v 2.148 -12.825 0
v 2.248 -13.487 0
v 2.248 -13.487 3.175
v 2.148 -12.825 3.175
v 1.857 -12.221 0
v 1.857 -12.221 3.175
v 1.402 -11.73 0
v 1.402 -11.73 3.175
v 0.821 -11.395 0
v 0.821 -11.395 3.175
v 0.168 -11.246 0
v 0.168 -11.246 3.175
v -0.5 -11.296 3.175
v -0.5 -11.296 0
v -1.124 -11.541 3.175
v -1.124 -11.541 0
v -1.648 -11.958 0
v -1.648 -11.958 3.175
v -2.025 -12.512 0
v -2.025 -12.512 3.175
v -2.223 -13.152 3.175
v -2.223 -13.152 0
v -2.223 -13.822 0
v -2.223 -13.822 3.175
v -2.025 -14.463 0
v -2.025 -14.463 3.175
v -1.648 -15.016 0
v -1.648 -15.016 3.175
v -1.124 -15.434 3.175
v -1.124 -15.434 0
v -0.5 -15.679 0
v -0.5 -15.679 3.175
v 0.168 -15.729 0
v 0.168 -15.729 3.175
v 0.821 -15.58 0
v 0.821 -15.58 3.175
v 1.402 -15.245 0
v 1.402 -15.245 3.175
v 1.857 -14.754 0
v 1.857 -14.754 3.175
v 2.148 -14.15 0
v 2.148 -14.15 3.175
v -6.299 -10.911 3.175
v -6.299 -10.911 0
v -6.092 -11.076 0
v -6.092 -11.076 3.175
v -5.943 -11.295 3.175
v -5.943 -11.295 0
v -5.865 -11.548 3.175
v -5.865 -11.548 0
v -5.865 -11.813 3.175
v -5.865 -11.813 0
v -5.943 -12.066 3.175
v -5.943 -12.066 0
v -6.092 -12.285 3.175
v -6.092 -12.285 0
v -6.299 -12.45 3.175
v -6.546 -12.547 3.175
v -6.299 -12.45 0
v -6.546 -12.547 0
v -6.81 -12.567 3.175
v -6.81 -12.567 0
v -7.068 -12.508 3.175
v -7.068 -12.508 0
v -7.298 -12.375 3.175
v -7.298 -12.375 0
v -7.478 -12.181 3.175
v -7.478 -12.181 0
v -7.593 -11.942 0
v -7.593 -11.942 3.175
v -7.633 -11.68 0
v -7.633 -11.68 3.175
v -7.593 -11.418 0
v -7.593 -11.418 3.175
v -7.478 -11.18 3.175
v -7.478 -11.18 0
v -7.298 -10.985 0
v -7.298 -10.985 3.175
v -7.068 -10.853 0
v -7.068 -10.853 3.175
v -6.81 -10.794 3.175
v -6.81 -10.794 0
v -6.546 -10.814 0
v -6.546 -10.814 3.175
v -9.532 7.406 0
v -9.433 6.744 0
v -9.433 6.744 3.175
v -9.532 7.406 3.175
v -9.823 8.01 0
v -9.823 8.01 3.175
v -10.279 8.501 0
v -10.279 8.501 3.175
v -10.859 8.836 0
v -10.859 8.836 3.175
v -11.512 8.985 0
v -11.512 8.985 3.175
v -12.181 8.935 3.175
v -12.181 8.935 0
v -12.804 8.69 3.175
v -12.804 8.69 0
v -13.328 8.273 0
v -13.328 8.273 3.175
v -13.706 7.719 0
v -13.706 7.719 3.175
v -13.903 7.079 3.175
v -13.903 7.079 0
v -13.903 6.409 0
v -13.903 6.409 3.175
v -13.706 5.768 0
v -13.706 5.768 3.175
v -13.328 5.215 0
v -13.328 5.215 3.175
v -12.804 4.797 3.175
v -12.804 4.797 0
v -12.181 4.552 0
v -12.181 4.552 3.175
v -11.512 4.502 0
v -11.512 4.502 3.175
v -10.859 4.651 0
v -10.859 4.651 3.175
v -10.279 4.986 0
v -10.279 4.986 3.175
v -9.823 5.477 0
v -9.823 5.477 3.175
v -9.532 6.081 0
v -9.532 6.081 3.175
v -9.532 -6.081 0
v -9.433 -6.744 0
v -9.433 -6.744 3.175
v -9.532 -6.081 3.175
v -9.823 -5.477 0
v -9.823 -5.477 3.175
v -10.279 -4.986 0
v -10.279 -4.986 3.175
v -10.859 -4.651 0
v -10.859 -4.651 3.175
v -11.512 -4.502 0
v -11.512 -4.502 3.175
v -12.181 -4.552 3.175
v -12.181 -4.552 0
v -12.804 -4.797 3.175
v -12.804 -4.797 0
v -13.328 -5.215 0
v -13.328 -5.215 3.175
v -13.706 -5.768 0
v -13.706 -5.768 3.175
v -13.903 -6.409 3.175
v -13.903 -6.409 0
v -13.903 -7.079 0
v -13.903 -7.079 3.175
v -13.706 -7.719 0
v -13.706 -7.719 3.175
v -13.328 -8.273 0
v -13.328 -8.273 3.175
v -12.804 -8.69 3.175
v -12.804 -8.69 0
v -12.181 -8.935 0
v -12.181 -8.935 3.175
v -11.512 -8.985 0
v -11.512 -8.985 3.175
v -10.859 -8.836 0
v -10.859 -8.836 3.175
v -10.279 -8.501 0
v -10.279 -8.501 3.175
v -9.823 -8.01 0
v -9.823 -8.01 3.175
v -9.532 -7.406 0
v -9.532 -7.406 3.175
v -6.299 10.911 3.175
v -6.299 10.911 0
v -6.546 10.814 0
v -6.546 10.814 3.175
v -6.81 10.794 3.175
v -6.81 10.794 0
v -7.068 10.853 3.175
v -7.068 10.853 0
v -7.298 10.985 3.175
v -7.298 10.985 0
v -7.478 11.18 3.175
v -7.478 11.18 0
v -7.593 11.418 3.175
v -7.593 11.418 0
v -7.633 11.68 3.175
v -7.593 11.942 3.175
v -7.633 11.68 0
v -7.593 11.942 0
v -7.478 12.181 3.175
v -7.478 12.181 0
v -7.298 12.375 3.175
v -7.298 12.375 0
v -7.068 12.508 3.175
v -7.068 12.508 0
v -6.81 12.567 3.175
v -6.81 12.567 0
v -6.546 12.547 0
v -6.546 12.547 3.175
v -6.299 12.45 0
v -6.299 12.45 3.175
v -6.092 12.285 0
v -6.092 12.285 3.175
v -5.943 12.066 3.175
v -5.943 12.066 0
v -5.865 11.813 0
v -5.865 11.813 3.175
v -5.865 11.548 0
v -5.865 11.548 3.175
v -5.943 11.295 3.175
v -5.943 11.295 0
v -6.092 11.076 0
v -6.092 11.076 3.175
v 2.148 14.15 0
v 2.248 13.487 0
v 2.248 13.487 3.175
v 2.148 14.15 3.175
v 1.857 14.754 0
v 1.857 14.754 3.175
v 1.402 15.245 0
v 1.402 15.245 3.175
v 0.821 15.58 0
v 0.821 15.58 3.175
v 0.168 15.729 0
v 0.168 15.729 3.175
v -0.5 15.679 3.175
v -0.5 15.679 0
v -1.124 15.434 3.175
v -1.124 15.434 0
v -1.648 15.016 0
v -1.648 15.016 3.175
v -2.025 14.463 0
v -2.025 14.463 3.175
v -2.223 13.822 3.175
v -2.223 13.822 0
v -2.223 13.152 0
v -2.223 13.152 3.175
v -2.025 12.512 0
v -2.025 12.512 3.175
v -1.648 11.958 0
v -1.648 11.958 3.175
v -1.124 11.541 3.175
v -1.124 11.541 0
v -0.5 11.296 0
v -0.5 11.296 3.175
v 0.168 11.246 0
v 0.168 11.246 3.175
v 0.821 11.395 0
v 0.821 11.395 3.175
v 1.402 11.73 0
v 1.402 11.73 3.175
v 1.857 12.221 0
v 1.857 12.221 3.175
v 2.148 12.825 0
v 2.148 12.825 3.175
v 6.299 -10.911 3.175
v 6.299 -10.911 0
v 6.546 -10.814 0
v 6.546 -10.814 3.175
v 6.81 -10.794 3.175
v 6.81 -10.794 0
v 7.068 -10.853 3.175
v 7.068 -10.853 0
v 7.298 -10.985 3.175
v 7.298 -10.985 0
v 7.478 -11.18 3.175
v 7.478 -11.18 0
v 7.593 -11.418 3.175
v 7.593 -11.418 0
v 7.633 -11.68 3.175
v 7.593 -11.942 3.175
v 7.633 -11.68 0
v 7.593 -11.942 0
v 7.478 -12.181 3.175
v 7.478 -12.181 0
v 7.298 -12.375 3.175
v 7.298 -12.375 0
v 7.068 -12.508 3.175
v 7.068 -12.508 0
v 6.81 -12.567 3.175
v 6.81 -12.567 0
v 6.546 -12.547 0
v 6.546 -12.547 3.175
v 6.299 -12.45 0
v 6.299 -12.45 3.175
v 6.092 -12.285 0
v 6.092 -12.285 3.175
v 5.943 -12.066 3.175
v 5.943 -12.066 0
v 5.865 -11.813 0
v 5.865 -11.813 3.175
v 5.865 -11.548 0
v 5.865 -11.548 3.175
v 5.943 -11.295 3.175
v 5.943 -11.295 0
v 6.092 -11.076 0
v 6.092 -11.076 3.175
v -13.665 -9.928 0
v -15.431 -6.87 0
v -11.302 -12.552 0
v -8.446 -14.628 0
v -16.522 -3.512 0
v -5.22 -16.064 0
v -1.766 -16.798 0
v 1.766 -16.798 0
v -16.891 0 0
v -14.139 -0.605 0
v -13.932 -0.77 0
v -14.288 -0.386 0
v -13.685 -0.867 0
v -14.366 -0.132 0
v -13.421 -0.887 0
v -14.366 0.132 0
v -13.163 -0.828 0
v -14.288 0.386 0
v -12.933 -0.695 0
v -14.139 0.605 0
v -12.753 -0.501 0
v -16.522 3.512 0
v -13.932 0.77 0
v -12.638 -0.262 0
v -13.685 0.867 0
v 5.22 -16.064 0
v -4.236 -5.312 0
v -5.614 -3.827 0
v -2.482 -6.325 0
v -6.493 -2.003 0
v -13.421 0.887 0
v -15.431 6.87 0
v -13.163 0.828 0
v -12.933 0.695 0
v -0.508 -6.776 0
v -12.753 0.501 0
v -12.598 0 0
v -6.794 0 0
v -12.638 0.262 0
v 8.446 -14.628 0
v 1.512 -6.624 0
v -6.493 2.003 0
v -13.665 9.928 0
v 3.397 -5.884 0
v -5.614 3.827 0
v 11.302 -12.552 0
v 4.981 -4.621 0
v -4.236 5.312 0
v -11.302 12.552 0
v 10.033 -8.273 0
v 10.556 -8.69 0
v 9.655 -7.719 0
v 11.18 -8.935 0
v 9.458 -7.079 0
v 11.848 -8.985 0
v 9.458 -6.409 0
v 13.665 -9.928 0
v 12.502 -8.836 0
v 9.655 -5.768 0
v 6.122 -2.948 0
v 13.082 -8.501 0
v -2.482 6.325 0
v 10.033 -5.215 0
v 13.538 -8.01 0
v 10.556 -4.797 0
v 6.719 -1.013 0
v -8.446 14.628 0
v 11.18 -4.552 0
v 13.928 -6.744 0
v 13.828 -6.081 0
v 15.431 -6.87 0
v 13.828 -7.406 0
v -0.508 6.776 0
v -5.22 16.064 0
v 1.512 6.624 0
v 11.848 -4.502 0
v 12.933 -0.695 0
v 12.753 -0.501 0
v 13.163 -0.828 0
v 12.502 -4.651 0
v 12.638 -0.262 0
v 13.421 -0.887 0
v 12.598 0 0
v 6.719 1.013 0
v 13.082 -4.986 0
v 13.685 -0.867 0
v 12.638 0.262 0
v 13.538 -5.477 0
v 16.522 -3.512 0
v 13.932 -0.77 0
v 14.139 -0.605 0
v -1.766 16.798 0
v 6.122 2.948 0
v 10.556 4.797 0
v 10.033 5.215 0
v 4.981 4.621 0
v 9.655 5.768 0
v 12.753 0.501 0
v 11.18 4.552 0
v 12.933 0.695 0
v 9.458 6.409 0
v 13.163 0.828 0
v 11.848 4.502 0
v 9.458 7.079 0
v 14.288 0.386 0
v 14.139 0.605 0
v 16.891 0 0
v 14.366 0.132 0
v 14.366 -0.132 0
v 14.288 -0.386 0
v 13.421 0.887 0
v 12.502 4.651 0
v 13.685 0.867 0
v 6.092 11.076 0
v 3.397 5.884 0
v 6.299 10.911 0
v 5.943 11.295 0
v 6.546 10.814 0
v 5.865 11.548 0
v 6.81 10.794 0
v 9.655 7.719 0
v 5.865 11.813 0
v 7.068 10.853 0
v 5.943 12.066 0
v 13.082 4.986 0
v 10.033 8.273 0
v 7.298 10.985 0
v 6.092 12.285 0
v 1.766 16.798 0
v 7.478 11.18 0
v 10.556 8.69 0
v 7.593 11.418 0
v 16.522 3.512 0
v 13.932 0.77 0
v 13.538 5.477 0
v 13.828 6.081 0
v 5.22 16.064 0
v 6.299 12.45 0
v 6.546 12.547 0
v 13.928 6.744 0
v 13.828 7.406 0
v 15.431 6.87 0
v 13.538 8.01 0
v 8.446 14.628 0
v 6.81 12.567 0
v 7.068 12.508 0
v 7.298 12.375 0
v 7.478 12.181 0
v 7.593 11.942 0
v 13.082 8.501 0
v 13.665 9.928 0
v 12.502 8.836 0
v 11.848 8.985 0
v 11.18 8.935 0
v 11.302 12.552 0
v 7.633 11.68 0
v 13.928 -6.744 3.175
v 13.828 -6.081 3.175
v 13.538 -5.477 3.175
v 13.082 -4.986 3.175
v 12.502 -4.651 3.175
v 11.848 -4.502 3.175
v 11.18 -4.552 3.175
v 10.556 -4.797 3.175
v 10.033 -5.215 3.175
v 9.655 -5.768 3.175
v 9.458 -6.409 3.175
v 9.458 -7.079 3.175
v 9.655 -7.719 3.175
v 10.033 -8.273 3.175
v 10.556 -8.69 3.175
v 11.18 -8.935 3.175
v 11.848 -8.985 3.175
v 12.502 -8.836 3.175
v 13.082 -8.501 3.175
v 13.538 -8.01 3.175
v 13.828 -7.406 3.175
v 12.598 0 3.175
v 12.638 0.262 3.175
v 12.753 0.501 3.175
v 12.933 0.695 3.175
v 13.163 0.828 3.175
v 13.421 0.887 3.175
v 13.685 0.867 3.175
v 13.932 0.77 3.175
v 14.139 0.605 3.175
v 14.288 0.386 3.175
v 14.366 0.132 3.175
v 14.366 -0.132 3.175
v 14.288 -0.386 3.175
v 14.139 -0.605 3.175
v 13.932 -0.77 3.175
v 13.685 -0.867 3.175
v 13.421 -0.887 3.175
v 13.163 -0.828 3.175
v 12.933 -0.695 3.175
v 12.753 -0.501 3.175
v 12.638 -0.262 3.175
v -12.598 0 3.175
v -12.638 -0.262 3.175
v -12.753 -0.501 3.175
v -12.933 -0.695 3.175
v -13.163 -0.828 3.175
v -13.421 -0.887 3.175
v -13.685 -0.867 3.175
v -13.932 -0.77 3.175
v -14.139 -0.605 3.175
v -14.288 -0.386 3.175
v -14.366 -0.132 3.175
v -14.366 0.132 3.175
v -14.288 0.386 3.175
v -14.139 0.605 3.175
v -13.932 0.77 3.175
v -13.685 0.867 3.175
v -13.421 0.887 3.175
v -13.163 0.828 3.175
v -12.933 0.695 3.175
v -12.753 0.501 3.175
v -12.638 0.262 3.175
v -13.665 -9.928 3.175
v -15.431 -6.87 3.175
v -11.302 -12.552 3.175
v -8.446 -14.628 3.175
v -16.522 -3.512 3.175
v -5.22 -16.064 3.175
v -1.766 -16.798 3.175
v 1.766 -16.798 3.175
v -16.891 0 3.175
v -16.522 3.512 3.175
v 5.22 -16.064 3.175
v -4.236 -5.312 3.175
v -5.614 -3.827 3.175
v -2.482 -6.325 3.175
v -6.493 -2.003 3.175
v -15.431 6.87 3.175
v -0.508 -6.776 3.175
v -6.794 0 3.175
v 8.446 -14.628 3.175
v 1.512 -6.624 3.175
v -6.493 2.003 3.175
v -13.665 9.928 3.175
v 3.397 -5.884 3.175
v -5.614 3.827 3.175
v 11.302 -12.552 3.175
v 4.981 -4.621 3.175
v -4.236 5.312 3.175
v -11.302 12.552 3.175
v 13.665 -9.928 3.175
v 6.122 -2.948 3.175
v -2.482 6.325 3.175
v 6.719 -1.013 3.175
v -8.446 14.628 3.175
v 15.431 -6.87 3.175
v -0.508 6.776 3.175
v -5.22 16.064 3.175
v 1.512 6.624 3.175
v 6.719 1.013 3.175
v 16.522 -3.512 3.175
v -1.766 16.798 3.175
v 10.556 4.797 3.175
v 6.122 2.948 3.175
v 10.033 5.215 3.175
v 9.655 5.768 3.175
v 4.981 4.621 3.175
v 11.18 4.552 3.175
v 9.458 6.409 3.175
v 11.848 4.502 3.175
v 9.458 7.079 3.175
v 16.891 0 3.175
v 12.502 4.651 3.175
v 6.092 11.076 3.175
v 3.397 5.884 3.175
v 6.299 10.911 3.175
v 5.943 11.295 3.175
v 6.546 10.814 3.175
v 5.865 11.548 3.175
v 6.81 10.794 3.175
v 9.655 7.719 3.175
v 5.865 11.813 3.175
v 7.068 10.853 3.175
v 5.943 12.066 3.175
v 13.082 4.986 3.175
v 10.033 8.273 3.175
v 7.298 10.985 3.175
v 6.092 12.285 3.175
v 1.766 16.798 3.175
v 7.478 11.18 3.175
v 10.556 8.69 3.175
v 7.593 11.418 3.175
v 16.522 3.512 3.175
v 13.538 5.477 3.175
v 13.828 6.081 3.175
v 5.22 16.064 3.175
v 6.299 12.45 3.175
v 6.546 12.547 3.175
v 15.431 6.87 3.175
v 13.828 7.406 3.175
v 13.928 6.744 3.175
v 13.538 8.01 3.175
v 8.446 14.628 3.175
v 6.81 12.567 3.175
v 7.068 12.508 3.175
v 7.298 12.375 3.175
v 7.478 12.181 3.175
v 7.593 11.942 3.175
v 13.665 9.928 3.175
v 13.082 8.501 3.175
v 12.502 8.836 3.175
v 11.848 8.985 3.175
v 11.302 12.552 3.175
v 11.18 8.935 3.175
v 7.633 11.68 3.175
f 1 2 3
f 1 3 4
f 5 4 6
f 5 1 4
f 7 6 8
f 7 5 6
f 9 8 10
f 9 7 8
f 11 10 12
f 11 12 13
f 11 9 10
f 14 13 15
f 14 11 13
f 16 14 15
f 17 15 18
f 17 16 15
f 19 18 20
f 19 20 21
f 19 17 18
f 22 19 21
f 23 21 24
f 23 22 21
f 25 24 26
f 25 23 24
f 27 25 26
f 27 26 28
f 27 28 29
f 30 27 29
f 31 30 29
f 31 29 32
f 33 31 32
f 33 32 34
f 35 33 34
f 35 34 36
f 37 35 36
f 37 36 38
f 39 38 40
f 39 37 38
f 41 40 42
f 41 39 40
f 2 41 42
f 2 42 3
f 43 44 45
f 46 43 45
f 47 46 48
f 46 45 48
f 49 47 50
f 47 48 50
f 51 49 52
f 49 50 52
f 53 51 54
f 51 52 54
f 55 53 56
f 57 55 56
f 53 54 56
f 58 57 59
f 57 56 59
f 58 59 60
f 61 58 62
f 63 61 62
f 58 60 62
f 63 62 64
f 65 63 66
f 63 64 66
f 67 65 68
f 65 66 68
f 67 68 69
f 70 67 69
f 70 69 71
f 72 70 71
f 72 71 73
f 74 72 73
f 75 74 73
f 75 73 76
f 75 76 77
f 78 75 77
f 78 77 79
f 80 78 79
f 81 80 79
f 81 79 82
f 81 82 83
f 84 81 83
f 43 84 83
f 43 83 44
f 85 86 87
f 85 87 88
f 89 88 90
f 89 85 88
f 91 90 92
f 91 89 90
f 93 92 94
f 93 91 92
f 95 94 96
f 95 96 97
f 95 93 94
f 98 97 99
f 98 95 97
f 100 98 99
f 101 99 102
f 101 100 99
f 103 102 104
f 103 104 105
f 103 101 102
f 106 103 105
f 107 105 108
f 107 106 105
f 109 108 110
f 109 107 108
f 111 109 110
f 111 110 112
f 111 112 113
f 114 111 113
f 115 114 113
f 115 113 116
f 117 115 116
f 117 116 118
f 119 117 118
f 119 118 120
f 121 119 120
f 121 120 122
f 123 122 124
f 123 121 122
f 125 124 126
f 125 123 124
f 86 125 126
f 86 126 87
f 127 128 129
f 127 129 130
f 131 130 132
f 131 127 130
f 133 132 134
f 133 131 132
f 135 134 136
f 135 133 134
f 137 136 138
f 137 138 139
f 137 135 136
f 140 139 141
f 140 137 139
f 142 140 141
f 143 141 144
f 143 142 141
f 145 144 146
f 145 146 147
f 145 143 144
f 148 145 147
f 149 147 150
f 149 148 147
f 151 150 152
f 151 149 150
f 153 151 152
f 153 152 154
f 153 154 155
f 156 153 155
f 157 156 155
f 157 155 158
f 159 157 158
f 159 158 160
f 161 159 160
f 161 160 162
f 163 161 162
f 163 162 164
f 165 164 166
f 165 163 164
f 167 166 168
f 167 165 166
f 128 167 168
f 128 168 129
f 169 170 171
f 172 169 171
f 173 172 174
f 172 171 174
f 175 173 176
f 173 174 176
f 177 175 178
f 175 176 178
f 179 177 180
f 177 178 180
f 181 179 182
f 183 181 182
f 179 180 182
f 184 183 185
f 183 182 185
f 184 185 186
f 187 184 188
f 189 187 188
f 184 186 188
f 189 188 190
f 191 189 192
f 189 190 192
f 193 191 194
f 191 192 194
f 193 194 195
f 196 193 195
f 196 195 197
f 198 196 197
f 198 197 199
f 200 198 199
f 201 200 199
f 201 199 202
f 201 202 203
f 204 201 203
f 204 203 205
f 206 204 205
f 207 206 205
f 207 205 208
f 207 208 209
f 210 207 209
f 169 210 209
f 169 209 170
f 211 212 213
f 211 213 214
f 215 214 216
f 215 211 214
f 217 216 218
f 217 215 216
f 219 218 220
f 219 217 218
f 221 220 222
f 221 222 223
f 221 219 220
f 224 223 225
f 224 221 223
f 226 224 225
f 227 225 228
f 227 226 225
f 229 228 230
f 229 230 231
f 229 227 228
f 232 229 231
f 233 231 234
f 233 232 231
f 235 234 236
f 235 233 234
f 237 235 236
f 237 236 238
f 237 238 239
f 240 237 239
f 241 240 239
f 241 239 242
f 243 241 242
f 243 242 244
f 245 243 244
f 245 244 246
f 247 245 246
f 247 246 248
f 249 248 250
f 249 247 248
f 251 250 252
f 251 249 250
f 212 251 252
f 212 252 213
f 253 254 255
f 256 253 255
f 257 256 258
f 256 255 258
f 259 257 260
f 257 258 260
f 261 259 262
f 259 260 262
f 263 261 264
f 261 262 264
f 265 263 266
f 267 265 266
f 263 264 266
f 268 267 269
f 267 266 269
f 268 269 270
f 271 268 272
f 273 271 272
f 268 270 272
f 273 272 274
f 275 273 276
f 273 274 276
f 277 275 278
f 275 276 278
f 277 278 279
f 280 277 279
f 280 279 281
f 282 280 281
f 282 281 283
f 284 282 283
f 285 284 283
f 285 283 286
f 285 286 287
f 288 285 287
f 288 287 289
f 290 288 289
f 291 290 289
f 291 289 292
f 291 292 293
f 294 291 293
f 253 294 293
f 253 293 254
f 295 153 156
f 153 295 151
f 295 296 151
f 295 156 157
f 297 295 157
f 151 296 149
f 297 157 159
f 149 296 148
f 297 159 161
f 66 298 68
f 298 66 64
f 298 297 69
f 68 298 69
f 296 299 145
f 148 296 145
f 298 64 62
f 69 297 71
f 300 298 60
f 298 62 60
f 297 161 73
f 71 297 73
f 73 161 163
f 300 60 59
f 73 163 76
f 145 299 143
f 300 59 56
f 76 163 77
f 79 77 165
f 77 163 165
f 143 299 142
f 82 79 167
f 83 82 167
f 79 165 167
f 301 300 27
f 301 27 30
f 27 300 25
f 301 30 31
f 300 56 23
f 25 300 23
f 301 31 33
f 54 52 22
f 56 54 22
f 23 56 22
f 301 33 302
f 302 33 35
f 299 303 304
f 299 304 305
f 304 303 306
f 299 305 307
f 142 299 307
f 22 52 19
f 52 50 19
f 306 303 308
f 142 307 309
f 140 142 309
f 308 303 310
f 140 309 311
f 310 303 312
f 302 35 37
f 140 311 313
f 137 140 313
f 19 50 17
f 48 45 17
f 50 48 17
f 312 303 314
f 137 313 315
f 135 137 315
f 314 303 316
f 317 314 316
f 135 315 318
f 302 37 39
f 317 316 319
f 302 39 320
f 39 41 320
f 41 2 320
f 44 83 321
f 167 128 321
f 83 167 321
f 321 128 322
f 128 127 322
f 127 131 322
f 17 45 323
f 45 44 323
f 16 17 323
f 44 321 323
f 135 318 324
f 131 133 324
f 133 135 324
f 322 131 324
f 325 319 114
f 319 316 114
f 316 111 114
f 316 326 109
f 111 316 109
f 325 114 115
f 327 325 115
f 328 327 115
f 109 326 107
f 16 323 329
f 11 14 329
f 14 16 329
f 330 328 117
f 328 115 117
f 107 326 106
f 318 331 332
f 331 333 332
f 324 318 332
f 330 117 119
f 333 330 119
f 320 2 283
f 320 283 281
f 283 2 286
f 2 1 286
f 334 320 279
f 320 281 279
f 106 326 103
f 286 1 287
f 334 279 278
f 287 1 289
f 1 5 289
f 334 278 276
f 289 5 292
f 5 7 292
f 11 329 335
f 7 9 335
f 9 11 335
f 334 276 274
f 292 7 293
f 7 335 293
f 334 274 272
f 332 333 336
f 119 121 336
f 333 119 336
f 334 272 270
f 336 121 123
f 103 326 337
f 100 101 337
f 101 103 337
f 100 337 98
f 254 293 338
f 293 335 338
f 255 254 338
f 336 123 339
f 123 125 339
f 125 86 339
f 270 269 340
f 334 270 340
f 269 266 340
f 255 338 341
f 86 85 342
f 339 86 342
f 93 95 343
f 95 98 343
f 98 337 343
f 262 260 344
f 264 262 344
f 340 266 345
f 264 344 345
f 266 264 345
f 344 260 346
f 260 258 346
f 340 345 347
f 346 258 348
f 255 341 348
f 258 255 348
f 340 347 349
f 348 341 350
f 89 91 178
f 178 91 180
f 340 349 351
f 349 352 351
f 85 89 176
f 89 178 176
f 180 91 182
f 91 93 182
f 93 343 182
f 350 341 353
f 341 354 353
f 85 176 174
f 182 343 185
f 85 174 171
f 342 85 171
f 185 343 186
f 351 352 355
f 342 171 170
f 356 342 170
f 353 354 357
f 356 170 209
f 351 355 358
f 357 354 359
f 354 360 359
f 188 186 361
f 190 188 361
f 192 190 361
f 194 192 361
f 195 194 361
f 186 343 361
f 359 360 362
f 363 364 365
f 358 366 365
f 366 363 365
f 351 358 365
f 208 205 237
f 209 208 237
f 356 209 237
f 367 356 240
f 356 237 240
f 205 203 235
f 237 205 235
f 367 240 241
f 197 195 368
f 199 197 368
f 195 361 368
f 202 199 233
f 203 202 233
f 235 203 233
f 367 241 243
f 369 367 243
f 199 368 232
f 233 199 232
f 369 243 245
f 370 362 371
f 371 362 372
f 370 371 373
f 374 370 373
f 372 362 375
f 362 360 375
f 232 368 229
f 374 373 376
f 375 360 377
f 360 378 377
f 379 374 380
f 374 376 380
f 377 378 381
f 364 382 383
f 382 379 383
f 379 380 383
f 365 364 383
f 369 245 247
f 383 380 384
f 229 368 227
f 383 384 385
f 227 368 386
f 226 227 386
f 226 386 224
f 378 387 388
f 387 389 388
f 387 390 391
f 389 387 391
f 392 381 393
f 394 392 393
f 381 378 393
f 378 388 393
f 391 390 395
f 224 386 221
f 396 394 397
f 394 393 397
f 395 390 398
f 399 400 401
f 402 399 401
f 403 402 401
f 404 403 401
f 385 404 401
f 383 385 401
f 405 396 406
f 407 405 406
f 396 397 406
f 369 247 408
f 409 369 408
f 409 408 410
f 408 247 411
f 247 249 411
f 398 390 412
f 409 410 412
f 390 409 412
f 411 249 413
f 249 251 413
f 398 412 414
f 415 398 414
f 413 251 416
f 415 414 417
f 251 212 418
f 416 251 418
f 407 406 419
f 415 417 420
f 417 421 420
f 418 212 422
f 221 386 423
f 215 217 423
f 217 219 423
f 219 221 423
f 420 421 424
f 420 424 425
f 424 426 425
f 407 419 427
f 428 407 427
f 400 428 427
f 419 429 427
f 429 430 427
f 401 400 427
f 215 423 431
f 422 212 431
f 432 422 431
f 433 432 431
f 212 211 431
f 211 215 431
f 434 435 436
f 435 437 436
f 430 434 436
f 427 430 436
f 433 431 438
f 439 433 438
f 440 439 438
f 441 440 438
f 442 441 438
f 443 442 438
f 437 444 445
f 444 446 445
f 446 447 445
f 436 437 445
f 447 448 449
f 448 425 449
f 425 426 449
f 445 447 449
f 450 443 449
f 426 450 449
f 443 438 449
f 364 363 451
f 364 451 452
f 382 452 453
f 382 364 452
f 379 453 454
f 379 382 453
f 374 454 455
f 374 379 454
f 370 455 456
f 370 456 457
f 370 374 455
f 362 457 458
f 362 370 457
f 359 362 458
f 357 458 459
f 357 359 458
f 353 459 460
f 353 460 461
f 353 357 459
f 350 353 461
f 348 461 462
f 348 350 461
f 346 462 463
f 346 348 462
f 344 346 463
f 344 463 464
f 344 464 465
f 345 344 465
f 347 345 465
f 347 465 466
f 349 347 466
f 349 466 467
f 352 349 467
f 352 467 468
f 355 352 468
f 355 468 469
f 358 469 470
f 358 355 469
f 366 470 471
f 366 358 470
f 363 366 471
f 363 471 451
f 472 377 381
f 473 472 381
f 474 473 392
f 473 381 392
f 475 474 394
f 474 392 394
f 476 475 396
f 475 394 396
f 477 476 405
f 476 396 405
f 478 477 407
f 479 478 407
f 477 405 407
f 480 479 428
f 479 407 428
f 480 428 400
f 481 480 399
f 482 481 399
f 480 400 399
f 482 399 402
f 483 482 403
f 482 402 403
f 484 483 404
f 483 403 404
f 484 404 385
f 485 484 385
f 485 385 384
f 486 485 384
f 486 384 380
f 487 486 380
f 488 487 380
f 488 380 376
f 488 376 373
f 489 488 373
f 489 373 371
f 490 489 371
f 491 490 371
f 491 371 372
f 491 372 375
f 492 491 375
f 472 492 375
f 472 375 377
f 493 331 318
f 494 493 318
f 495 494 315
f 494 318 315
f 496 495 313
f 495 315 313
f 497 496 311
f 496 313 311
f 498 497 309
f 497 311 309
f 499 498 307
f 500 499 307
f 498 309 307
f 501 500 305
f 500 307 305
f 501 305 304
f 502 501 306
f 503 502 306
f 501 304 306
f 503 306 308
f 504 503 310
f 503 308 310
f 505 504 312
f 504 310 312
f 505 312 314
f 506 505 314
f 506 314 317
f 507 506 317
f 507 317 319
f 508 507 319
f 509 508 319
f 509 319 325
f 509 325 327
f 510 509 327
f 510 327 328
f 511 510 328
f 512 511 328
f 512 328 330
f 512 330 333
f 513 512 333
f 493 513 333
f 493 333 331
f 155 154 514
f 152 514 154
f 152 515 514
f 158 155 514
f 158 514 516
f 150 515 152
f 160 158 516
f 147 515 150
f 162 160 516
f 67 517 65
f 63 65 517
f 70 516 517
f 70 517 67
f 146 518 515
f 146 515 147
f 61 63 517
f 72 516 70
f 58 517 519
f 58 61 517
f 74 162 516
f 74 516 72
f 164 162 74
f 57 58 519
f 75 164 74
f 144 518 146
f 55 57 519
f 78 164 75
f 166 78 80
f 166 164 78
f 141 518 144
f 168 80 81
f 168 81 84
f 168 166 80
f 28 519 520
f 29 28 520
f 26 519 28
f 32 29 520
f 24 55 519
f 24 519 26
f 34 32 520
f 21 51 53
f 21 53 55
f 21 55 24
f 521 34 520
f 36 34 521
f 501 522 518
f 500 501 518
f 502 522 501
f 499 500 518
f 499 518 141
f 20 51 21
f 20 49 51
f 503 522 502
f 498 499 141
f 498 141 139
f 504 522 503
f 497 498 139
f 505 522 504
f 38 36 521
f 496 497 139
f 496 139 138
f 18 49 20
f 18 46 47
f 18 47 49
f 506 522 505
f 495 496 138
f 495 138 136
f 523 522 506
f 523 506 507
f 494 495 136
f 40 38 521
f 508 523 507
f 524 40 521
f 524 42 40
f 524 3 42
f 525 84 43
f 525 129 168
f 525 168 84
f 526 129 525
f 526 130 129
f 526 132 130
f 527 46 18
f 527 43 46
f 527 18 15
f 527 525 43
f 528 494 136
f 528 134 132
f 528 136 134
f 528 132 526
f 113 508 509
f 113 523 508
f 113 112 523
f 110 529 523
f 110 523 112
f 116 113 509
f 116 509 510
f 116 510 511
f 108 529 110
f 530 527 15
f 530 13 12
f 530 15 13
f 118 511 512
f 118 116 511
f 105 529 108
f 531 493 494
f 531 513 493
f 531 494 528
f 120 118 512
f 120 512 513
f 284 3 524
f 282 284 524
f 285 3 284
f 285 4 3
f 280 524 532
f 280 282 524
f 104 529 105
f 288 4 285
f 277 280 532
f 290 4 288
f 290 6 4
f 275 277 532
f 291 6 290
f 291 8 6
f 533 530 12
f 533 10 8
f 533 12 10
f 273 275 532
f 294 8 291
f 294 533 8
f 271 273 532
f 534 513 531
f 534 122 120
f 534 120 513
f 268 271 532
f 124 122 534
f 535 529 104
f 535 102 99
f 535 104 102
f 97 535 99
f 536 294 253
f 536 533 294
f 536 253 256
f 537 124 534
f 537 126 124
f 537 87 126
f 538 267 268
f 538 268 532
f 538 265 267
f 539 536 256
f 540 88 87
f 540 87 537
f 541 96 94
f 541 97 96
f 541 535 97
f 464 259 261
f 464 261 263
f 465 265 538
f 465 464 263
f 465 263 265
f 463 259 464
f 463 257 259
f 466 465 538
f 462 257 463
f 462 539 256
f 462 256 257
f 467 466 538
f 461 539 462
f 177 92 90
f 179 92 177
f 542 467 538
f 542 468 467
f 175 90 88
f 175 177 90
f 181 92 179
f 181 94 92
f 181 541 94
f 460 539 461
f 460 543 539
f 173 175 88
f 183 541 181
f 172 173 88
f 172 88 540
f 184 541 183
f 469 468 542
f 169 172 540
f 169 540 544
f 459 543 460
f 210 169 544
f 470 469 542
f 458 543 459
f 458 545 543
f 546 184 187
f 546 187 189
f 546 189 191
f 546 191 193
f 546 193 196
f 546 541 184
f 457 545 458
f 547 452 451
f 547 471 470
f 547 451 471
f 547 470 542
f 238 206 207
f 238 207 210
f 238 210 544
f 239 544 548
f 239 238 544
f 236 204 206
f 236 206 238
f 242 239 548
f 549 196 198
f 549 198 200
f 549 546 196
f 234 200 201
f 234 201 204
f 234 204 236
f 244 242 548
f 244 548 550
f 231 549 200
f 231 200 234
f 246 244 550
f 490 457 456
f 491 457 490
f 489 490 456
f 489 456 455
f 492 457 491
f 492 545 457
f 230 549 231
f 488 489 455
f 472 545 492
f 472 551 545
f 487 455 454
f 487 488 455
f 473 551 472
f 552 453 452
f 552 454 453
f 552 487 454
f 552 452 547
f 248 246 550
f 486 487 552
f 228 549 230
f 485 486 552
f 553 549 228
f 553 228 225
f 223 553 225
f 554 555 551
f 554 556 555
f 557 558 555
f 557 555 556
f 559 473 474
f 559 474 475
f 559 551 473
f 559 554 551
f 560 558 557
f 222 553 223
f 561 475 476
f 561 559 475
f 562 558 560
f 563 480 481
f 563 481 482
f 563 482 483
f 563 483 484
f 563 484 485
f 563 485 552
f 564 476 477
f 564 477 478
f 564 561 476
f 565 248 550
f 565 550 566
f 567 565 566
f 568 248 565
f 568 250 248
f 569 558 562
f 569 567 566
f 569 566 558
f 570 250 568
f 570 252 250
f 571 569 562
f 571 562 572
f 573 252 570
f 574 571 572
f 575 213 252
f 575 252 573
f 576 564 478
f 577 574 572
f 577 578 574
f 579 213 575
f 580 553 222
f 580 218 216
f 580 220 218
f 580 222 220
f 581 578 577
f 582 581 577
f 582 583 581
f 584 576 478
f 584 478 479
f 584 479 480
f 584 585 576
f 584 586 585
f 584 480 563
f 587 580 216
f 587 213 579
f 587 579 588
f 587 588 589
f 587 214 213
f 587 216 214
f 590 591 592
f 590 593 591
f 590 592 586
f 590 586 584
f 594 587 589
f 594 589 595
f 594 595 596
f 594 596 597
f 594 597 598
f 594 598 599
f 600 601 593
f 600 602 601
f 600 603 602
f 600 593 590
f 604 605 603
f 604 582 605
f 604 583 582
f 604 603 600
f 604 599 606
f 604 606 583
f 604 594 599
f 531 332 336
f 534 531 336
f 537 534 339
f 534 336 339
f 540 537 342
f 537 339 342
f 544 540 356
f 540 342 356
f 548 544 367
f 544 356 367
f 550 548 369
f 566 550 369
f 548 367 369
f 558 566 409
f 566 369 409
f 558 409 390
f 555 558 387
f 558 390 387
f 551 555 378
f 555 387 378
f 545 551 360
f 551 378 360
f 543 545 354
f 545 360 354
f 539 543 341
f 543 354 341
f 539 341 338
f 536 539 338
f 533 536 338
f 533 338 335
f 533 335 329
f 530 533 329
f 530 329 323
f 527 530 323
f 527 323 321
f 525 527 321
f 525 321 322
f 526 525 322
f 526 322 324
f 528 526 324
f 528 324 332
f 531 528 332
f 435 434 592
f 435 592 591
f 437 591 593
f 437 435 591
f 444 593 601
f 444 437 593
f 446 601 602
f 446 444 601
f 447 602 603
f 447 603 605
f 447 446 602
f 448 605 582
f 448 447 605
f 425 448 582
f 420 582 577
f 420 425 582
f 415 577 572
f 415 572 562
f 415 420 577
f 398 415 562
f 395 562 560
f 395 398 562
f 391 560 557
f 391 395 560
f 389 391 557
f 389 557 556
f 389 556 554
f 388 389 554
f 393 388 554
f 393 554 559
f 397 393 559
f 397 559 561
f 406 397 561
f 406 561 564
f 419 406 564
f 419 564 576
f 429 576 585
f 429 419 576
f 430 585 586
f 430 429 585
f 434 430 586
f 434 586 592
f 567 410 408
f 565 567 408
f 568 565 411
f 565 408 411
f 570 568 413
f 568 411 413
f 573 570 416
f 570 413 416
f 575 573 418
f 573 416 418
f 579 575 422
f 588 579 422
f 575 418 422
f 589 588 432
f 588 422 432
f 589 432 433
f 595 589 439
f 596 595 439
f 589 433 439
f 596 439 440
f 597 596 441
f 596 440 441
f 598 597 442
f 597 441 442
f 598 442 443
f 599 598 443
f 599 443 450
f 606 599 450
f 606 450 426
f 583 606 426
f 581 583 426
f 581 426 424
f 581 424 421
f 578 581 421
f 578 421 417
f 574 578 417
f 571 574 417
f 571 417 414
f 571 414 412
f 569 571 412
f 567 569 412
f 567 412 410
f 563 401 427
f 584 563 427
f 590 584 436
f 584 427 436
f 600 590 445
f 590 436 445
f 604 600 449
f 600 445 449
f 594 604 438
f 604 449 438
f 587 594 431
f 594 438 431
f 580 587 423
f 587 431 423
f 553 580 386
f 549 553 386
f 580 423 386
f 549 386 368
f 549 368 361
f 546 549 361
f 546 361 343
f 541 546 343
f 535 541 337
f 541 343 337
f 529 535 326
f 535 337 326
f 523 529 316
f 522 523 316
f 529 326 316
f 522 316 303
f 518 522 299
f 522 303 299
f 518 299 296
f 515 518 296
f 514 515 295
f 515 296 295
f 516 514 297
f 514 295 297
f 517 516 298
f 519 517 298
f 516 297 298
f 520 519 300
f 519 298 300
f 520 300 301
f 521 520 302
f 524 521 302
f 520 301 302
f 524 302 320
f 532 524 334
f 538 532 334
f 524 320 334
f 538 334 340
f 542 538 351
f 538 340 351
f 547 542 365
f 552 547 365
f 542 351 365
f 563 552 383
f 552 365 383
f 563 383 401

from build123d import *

# Parameters (mm, degrees)
SKETCH1_R                 = 16.891
SKETCH1_R_2               = 2.2479
BOSS_EXTRUDE1_DEPTH       = 3.175
TAP_DRILL_FOR_4_40_TAP1_D = 13.589
TAP_DRILL_FOR_2_56_TAP1_D = 1.778
CIRPATTERN1_COUNT         = 6


with BuildPart() as part:
    # Sketch1 → Boss-Extrude1 (new body)
    with BuildSketch(Plane.XY):
        Circle(SKETCH1_R)
        with Locations((0, -13.4874)):
            Circle(SKETCH1_R_2, mode=Mode.SUBTRACT)
        with Locations((-11.680431031, -6.7437)):
            Circle(SKETCH1_R_2, mode=Mode.SUBTRACT)
        with Locations((-11.680431031, 6.7437)):
            Circle(SKETCH1_R_2, mode=Mode.SUBTRACT)
        with Locations((0, 13.4874)):
            Circle(SKETCH1_R_2, mode=Mode.SUBTRACT)
        with Locations((11.680431031, 6.7437)):
            Circle(SKETCH1_R_2, mode=Mode.SUBTRACT)
        with Locations((11.680431031, -6.7437)):
            Circle(SKETCH1_R_2, mode=Mode.SUBTRACT)
    extrude(amount=BOSS_EXTRUDE1_DEPTH)

    # Tap Drill for #4-40 Tap1 (through all)
    with Locations(Plane.XY.offset(3.175)):
        with Locations((0, 0)):
            Hole(TAP_DRILL_FOR_4_40_TAP1_D / 2)

    # Tap Drill for #2-56 Tap1 (through all)
    with Locations(Plane.XY.offset(3.175)):
        with Locations((13.4874, 0)):
            tap_drill_for_2_56_tap1 = Hole(TAP_DRILL_FOR_2_56_TAP1_D / 2)

    # CirPattern1: Tap Drill for #2-56 Tap1 ×6 about axis
    cirpattern1_axis = Axis((0, 0, 0), (0, 0, 1))
    for i in range(1, CIRPATTERN1_COUNT):
        add(tap_drill_for_2_56_tap1.rotate(cirpattern1_axis, i * 360 / CIRPATTERN1_COUNT), mode=Mode.SUBTRACT)


solid = part.part
